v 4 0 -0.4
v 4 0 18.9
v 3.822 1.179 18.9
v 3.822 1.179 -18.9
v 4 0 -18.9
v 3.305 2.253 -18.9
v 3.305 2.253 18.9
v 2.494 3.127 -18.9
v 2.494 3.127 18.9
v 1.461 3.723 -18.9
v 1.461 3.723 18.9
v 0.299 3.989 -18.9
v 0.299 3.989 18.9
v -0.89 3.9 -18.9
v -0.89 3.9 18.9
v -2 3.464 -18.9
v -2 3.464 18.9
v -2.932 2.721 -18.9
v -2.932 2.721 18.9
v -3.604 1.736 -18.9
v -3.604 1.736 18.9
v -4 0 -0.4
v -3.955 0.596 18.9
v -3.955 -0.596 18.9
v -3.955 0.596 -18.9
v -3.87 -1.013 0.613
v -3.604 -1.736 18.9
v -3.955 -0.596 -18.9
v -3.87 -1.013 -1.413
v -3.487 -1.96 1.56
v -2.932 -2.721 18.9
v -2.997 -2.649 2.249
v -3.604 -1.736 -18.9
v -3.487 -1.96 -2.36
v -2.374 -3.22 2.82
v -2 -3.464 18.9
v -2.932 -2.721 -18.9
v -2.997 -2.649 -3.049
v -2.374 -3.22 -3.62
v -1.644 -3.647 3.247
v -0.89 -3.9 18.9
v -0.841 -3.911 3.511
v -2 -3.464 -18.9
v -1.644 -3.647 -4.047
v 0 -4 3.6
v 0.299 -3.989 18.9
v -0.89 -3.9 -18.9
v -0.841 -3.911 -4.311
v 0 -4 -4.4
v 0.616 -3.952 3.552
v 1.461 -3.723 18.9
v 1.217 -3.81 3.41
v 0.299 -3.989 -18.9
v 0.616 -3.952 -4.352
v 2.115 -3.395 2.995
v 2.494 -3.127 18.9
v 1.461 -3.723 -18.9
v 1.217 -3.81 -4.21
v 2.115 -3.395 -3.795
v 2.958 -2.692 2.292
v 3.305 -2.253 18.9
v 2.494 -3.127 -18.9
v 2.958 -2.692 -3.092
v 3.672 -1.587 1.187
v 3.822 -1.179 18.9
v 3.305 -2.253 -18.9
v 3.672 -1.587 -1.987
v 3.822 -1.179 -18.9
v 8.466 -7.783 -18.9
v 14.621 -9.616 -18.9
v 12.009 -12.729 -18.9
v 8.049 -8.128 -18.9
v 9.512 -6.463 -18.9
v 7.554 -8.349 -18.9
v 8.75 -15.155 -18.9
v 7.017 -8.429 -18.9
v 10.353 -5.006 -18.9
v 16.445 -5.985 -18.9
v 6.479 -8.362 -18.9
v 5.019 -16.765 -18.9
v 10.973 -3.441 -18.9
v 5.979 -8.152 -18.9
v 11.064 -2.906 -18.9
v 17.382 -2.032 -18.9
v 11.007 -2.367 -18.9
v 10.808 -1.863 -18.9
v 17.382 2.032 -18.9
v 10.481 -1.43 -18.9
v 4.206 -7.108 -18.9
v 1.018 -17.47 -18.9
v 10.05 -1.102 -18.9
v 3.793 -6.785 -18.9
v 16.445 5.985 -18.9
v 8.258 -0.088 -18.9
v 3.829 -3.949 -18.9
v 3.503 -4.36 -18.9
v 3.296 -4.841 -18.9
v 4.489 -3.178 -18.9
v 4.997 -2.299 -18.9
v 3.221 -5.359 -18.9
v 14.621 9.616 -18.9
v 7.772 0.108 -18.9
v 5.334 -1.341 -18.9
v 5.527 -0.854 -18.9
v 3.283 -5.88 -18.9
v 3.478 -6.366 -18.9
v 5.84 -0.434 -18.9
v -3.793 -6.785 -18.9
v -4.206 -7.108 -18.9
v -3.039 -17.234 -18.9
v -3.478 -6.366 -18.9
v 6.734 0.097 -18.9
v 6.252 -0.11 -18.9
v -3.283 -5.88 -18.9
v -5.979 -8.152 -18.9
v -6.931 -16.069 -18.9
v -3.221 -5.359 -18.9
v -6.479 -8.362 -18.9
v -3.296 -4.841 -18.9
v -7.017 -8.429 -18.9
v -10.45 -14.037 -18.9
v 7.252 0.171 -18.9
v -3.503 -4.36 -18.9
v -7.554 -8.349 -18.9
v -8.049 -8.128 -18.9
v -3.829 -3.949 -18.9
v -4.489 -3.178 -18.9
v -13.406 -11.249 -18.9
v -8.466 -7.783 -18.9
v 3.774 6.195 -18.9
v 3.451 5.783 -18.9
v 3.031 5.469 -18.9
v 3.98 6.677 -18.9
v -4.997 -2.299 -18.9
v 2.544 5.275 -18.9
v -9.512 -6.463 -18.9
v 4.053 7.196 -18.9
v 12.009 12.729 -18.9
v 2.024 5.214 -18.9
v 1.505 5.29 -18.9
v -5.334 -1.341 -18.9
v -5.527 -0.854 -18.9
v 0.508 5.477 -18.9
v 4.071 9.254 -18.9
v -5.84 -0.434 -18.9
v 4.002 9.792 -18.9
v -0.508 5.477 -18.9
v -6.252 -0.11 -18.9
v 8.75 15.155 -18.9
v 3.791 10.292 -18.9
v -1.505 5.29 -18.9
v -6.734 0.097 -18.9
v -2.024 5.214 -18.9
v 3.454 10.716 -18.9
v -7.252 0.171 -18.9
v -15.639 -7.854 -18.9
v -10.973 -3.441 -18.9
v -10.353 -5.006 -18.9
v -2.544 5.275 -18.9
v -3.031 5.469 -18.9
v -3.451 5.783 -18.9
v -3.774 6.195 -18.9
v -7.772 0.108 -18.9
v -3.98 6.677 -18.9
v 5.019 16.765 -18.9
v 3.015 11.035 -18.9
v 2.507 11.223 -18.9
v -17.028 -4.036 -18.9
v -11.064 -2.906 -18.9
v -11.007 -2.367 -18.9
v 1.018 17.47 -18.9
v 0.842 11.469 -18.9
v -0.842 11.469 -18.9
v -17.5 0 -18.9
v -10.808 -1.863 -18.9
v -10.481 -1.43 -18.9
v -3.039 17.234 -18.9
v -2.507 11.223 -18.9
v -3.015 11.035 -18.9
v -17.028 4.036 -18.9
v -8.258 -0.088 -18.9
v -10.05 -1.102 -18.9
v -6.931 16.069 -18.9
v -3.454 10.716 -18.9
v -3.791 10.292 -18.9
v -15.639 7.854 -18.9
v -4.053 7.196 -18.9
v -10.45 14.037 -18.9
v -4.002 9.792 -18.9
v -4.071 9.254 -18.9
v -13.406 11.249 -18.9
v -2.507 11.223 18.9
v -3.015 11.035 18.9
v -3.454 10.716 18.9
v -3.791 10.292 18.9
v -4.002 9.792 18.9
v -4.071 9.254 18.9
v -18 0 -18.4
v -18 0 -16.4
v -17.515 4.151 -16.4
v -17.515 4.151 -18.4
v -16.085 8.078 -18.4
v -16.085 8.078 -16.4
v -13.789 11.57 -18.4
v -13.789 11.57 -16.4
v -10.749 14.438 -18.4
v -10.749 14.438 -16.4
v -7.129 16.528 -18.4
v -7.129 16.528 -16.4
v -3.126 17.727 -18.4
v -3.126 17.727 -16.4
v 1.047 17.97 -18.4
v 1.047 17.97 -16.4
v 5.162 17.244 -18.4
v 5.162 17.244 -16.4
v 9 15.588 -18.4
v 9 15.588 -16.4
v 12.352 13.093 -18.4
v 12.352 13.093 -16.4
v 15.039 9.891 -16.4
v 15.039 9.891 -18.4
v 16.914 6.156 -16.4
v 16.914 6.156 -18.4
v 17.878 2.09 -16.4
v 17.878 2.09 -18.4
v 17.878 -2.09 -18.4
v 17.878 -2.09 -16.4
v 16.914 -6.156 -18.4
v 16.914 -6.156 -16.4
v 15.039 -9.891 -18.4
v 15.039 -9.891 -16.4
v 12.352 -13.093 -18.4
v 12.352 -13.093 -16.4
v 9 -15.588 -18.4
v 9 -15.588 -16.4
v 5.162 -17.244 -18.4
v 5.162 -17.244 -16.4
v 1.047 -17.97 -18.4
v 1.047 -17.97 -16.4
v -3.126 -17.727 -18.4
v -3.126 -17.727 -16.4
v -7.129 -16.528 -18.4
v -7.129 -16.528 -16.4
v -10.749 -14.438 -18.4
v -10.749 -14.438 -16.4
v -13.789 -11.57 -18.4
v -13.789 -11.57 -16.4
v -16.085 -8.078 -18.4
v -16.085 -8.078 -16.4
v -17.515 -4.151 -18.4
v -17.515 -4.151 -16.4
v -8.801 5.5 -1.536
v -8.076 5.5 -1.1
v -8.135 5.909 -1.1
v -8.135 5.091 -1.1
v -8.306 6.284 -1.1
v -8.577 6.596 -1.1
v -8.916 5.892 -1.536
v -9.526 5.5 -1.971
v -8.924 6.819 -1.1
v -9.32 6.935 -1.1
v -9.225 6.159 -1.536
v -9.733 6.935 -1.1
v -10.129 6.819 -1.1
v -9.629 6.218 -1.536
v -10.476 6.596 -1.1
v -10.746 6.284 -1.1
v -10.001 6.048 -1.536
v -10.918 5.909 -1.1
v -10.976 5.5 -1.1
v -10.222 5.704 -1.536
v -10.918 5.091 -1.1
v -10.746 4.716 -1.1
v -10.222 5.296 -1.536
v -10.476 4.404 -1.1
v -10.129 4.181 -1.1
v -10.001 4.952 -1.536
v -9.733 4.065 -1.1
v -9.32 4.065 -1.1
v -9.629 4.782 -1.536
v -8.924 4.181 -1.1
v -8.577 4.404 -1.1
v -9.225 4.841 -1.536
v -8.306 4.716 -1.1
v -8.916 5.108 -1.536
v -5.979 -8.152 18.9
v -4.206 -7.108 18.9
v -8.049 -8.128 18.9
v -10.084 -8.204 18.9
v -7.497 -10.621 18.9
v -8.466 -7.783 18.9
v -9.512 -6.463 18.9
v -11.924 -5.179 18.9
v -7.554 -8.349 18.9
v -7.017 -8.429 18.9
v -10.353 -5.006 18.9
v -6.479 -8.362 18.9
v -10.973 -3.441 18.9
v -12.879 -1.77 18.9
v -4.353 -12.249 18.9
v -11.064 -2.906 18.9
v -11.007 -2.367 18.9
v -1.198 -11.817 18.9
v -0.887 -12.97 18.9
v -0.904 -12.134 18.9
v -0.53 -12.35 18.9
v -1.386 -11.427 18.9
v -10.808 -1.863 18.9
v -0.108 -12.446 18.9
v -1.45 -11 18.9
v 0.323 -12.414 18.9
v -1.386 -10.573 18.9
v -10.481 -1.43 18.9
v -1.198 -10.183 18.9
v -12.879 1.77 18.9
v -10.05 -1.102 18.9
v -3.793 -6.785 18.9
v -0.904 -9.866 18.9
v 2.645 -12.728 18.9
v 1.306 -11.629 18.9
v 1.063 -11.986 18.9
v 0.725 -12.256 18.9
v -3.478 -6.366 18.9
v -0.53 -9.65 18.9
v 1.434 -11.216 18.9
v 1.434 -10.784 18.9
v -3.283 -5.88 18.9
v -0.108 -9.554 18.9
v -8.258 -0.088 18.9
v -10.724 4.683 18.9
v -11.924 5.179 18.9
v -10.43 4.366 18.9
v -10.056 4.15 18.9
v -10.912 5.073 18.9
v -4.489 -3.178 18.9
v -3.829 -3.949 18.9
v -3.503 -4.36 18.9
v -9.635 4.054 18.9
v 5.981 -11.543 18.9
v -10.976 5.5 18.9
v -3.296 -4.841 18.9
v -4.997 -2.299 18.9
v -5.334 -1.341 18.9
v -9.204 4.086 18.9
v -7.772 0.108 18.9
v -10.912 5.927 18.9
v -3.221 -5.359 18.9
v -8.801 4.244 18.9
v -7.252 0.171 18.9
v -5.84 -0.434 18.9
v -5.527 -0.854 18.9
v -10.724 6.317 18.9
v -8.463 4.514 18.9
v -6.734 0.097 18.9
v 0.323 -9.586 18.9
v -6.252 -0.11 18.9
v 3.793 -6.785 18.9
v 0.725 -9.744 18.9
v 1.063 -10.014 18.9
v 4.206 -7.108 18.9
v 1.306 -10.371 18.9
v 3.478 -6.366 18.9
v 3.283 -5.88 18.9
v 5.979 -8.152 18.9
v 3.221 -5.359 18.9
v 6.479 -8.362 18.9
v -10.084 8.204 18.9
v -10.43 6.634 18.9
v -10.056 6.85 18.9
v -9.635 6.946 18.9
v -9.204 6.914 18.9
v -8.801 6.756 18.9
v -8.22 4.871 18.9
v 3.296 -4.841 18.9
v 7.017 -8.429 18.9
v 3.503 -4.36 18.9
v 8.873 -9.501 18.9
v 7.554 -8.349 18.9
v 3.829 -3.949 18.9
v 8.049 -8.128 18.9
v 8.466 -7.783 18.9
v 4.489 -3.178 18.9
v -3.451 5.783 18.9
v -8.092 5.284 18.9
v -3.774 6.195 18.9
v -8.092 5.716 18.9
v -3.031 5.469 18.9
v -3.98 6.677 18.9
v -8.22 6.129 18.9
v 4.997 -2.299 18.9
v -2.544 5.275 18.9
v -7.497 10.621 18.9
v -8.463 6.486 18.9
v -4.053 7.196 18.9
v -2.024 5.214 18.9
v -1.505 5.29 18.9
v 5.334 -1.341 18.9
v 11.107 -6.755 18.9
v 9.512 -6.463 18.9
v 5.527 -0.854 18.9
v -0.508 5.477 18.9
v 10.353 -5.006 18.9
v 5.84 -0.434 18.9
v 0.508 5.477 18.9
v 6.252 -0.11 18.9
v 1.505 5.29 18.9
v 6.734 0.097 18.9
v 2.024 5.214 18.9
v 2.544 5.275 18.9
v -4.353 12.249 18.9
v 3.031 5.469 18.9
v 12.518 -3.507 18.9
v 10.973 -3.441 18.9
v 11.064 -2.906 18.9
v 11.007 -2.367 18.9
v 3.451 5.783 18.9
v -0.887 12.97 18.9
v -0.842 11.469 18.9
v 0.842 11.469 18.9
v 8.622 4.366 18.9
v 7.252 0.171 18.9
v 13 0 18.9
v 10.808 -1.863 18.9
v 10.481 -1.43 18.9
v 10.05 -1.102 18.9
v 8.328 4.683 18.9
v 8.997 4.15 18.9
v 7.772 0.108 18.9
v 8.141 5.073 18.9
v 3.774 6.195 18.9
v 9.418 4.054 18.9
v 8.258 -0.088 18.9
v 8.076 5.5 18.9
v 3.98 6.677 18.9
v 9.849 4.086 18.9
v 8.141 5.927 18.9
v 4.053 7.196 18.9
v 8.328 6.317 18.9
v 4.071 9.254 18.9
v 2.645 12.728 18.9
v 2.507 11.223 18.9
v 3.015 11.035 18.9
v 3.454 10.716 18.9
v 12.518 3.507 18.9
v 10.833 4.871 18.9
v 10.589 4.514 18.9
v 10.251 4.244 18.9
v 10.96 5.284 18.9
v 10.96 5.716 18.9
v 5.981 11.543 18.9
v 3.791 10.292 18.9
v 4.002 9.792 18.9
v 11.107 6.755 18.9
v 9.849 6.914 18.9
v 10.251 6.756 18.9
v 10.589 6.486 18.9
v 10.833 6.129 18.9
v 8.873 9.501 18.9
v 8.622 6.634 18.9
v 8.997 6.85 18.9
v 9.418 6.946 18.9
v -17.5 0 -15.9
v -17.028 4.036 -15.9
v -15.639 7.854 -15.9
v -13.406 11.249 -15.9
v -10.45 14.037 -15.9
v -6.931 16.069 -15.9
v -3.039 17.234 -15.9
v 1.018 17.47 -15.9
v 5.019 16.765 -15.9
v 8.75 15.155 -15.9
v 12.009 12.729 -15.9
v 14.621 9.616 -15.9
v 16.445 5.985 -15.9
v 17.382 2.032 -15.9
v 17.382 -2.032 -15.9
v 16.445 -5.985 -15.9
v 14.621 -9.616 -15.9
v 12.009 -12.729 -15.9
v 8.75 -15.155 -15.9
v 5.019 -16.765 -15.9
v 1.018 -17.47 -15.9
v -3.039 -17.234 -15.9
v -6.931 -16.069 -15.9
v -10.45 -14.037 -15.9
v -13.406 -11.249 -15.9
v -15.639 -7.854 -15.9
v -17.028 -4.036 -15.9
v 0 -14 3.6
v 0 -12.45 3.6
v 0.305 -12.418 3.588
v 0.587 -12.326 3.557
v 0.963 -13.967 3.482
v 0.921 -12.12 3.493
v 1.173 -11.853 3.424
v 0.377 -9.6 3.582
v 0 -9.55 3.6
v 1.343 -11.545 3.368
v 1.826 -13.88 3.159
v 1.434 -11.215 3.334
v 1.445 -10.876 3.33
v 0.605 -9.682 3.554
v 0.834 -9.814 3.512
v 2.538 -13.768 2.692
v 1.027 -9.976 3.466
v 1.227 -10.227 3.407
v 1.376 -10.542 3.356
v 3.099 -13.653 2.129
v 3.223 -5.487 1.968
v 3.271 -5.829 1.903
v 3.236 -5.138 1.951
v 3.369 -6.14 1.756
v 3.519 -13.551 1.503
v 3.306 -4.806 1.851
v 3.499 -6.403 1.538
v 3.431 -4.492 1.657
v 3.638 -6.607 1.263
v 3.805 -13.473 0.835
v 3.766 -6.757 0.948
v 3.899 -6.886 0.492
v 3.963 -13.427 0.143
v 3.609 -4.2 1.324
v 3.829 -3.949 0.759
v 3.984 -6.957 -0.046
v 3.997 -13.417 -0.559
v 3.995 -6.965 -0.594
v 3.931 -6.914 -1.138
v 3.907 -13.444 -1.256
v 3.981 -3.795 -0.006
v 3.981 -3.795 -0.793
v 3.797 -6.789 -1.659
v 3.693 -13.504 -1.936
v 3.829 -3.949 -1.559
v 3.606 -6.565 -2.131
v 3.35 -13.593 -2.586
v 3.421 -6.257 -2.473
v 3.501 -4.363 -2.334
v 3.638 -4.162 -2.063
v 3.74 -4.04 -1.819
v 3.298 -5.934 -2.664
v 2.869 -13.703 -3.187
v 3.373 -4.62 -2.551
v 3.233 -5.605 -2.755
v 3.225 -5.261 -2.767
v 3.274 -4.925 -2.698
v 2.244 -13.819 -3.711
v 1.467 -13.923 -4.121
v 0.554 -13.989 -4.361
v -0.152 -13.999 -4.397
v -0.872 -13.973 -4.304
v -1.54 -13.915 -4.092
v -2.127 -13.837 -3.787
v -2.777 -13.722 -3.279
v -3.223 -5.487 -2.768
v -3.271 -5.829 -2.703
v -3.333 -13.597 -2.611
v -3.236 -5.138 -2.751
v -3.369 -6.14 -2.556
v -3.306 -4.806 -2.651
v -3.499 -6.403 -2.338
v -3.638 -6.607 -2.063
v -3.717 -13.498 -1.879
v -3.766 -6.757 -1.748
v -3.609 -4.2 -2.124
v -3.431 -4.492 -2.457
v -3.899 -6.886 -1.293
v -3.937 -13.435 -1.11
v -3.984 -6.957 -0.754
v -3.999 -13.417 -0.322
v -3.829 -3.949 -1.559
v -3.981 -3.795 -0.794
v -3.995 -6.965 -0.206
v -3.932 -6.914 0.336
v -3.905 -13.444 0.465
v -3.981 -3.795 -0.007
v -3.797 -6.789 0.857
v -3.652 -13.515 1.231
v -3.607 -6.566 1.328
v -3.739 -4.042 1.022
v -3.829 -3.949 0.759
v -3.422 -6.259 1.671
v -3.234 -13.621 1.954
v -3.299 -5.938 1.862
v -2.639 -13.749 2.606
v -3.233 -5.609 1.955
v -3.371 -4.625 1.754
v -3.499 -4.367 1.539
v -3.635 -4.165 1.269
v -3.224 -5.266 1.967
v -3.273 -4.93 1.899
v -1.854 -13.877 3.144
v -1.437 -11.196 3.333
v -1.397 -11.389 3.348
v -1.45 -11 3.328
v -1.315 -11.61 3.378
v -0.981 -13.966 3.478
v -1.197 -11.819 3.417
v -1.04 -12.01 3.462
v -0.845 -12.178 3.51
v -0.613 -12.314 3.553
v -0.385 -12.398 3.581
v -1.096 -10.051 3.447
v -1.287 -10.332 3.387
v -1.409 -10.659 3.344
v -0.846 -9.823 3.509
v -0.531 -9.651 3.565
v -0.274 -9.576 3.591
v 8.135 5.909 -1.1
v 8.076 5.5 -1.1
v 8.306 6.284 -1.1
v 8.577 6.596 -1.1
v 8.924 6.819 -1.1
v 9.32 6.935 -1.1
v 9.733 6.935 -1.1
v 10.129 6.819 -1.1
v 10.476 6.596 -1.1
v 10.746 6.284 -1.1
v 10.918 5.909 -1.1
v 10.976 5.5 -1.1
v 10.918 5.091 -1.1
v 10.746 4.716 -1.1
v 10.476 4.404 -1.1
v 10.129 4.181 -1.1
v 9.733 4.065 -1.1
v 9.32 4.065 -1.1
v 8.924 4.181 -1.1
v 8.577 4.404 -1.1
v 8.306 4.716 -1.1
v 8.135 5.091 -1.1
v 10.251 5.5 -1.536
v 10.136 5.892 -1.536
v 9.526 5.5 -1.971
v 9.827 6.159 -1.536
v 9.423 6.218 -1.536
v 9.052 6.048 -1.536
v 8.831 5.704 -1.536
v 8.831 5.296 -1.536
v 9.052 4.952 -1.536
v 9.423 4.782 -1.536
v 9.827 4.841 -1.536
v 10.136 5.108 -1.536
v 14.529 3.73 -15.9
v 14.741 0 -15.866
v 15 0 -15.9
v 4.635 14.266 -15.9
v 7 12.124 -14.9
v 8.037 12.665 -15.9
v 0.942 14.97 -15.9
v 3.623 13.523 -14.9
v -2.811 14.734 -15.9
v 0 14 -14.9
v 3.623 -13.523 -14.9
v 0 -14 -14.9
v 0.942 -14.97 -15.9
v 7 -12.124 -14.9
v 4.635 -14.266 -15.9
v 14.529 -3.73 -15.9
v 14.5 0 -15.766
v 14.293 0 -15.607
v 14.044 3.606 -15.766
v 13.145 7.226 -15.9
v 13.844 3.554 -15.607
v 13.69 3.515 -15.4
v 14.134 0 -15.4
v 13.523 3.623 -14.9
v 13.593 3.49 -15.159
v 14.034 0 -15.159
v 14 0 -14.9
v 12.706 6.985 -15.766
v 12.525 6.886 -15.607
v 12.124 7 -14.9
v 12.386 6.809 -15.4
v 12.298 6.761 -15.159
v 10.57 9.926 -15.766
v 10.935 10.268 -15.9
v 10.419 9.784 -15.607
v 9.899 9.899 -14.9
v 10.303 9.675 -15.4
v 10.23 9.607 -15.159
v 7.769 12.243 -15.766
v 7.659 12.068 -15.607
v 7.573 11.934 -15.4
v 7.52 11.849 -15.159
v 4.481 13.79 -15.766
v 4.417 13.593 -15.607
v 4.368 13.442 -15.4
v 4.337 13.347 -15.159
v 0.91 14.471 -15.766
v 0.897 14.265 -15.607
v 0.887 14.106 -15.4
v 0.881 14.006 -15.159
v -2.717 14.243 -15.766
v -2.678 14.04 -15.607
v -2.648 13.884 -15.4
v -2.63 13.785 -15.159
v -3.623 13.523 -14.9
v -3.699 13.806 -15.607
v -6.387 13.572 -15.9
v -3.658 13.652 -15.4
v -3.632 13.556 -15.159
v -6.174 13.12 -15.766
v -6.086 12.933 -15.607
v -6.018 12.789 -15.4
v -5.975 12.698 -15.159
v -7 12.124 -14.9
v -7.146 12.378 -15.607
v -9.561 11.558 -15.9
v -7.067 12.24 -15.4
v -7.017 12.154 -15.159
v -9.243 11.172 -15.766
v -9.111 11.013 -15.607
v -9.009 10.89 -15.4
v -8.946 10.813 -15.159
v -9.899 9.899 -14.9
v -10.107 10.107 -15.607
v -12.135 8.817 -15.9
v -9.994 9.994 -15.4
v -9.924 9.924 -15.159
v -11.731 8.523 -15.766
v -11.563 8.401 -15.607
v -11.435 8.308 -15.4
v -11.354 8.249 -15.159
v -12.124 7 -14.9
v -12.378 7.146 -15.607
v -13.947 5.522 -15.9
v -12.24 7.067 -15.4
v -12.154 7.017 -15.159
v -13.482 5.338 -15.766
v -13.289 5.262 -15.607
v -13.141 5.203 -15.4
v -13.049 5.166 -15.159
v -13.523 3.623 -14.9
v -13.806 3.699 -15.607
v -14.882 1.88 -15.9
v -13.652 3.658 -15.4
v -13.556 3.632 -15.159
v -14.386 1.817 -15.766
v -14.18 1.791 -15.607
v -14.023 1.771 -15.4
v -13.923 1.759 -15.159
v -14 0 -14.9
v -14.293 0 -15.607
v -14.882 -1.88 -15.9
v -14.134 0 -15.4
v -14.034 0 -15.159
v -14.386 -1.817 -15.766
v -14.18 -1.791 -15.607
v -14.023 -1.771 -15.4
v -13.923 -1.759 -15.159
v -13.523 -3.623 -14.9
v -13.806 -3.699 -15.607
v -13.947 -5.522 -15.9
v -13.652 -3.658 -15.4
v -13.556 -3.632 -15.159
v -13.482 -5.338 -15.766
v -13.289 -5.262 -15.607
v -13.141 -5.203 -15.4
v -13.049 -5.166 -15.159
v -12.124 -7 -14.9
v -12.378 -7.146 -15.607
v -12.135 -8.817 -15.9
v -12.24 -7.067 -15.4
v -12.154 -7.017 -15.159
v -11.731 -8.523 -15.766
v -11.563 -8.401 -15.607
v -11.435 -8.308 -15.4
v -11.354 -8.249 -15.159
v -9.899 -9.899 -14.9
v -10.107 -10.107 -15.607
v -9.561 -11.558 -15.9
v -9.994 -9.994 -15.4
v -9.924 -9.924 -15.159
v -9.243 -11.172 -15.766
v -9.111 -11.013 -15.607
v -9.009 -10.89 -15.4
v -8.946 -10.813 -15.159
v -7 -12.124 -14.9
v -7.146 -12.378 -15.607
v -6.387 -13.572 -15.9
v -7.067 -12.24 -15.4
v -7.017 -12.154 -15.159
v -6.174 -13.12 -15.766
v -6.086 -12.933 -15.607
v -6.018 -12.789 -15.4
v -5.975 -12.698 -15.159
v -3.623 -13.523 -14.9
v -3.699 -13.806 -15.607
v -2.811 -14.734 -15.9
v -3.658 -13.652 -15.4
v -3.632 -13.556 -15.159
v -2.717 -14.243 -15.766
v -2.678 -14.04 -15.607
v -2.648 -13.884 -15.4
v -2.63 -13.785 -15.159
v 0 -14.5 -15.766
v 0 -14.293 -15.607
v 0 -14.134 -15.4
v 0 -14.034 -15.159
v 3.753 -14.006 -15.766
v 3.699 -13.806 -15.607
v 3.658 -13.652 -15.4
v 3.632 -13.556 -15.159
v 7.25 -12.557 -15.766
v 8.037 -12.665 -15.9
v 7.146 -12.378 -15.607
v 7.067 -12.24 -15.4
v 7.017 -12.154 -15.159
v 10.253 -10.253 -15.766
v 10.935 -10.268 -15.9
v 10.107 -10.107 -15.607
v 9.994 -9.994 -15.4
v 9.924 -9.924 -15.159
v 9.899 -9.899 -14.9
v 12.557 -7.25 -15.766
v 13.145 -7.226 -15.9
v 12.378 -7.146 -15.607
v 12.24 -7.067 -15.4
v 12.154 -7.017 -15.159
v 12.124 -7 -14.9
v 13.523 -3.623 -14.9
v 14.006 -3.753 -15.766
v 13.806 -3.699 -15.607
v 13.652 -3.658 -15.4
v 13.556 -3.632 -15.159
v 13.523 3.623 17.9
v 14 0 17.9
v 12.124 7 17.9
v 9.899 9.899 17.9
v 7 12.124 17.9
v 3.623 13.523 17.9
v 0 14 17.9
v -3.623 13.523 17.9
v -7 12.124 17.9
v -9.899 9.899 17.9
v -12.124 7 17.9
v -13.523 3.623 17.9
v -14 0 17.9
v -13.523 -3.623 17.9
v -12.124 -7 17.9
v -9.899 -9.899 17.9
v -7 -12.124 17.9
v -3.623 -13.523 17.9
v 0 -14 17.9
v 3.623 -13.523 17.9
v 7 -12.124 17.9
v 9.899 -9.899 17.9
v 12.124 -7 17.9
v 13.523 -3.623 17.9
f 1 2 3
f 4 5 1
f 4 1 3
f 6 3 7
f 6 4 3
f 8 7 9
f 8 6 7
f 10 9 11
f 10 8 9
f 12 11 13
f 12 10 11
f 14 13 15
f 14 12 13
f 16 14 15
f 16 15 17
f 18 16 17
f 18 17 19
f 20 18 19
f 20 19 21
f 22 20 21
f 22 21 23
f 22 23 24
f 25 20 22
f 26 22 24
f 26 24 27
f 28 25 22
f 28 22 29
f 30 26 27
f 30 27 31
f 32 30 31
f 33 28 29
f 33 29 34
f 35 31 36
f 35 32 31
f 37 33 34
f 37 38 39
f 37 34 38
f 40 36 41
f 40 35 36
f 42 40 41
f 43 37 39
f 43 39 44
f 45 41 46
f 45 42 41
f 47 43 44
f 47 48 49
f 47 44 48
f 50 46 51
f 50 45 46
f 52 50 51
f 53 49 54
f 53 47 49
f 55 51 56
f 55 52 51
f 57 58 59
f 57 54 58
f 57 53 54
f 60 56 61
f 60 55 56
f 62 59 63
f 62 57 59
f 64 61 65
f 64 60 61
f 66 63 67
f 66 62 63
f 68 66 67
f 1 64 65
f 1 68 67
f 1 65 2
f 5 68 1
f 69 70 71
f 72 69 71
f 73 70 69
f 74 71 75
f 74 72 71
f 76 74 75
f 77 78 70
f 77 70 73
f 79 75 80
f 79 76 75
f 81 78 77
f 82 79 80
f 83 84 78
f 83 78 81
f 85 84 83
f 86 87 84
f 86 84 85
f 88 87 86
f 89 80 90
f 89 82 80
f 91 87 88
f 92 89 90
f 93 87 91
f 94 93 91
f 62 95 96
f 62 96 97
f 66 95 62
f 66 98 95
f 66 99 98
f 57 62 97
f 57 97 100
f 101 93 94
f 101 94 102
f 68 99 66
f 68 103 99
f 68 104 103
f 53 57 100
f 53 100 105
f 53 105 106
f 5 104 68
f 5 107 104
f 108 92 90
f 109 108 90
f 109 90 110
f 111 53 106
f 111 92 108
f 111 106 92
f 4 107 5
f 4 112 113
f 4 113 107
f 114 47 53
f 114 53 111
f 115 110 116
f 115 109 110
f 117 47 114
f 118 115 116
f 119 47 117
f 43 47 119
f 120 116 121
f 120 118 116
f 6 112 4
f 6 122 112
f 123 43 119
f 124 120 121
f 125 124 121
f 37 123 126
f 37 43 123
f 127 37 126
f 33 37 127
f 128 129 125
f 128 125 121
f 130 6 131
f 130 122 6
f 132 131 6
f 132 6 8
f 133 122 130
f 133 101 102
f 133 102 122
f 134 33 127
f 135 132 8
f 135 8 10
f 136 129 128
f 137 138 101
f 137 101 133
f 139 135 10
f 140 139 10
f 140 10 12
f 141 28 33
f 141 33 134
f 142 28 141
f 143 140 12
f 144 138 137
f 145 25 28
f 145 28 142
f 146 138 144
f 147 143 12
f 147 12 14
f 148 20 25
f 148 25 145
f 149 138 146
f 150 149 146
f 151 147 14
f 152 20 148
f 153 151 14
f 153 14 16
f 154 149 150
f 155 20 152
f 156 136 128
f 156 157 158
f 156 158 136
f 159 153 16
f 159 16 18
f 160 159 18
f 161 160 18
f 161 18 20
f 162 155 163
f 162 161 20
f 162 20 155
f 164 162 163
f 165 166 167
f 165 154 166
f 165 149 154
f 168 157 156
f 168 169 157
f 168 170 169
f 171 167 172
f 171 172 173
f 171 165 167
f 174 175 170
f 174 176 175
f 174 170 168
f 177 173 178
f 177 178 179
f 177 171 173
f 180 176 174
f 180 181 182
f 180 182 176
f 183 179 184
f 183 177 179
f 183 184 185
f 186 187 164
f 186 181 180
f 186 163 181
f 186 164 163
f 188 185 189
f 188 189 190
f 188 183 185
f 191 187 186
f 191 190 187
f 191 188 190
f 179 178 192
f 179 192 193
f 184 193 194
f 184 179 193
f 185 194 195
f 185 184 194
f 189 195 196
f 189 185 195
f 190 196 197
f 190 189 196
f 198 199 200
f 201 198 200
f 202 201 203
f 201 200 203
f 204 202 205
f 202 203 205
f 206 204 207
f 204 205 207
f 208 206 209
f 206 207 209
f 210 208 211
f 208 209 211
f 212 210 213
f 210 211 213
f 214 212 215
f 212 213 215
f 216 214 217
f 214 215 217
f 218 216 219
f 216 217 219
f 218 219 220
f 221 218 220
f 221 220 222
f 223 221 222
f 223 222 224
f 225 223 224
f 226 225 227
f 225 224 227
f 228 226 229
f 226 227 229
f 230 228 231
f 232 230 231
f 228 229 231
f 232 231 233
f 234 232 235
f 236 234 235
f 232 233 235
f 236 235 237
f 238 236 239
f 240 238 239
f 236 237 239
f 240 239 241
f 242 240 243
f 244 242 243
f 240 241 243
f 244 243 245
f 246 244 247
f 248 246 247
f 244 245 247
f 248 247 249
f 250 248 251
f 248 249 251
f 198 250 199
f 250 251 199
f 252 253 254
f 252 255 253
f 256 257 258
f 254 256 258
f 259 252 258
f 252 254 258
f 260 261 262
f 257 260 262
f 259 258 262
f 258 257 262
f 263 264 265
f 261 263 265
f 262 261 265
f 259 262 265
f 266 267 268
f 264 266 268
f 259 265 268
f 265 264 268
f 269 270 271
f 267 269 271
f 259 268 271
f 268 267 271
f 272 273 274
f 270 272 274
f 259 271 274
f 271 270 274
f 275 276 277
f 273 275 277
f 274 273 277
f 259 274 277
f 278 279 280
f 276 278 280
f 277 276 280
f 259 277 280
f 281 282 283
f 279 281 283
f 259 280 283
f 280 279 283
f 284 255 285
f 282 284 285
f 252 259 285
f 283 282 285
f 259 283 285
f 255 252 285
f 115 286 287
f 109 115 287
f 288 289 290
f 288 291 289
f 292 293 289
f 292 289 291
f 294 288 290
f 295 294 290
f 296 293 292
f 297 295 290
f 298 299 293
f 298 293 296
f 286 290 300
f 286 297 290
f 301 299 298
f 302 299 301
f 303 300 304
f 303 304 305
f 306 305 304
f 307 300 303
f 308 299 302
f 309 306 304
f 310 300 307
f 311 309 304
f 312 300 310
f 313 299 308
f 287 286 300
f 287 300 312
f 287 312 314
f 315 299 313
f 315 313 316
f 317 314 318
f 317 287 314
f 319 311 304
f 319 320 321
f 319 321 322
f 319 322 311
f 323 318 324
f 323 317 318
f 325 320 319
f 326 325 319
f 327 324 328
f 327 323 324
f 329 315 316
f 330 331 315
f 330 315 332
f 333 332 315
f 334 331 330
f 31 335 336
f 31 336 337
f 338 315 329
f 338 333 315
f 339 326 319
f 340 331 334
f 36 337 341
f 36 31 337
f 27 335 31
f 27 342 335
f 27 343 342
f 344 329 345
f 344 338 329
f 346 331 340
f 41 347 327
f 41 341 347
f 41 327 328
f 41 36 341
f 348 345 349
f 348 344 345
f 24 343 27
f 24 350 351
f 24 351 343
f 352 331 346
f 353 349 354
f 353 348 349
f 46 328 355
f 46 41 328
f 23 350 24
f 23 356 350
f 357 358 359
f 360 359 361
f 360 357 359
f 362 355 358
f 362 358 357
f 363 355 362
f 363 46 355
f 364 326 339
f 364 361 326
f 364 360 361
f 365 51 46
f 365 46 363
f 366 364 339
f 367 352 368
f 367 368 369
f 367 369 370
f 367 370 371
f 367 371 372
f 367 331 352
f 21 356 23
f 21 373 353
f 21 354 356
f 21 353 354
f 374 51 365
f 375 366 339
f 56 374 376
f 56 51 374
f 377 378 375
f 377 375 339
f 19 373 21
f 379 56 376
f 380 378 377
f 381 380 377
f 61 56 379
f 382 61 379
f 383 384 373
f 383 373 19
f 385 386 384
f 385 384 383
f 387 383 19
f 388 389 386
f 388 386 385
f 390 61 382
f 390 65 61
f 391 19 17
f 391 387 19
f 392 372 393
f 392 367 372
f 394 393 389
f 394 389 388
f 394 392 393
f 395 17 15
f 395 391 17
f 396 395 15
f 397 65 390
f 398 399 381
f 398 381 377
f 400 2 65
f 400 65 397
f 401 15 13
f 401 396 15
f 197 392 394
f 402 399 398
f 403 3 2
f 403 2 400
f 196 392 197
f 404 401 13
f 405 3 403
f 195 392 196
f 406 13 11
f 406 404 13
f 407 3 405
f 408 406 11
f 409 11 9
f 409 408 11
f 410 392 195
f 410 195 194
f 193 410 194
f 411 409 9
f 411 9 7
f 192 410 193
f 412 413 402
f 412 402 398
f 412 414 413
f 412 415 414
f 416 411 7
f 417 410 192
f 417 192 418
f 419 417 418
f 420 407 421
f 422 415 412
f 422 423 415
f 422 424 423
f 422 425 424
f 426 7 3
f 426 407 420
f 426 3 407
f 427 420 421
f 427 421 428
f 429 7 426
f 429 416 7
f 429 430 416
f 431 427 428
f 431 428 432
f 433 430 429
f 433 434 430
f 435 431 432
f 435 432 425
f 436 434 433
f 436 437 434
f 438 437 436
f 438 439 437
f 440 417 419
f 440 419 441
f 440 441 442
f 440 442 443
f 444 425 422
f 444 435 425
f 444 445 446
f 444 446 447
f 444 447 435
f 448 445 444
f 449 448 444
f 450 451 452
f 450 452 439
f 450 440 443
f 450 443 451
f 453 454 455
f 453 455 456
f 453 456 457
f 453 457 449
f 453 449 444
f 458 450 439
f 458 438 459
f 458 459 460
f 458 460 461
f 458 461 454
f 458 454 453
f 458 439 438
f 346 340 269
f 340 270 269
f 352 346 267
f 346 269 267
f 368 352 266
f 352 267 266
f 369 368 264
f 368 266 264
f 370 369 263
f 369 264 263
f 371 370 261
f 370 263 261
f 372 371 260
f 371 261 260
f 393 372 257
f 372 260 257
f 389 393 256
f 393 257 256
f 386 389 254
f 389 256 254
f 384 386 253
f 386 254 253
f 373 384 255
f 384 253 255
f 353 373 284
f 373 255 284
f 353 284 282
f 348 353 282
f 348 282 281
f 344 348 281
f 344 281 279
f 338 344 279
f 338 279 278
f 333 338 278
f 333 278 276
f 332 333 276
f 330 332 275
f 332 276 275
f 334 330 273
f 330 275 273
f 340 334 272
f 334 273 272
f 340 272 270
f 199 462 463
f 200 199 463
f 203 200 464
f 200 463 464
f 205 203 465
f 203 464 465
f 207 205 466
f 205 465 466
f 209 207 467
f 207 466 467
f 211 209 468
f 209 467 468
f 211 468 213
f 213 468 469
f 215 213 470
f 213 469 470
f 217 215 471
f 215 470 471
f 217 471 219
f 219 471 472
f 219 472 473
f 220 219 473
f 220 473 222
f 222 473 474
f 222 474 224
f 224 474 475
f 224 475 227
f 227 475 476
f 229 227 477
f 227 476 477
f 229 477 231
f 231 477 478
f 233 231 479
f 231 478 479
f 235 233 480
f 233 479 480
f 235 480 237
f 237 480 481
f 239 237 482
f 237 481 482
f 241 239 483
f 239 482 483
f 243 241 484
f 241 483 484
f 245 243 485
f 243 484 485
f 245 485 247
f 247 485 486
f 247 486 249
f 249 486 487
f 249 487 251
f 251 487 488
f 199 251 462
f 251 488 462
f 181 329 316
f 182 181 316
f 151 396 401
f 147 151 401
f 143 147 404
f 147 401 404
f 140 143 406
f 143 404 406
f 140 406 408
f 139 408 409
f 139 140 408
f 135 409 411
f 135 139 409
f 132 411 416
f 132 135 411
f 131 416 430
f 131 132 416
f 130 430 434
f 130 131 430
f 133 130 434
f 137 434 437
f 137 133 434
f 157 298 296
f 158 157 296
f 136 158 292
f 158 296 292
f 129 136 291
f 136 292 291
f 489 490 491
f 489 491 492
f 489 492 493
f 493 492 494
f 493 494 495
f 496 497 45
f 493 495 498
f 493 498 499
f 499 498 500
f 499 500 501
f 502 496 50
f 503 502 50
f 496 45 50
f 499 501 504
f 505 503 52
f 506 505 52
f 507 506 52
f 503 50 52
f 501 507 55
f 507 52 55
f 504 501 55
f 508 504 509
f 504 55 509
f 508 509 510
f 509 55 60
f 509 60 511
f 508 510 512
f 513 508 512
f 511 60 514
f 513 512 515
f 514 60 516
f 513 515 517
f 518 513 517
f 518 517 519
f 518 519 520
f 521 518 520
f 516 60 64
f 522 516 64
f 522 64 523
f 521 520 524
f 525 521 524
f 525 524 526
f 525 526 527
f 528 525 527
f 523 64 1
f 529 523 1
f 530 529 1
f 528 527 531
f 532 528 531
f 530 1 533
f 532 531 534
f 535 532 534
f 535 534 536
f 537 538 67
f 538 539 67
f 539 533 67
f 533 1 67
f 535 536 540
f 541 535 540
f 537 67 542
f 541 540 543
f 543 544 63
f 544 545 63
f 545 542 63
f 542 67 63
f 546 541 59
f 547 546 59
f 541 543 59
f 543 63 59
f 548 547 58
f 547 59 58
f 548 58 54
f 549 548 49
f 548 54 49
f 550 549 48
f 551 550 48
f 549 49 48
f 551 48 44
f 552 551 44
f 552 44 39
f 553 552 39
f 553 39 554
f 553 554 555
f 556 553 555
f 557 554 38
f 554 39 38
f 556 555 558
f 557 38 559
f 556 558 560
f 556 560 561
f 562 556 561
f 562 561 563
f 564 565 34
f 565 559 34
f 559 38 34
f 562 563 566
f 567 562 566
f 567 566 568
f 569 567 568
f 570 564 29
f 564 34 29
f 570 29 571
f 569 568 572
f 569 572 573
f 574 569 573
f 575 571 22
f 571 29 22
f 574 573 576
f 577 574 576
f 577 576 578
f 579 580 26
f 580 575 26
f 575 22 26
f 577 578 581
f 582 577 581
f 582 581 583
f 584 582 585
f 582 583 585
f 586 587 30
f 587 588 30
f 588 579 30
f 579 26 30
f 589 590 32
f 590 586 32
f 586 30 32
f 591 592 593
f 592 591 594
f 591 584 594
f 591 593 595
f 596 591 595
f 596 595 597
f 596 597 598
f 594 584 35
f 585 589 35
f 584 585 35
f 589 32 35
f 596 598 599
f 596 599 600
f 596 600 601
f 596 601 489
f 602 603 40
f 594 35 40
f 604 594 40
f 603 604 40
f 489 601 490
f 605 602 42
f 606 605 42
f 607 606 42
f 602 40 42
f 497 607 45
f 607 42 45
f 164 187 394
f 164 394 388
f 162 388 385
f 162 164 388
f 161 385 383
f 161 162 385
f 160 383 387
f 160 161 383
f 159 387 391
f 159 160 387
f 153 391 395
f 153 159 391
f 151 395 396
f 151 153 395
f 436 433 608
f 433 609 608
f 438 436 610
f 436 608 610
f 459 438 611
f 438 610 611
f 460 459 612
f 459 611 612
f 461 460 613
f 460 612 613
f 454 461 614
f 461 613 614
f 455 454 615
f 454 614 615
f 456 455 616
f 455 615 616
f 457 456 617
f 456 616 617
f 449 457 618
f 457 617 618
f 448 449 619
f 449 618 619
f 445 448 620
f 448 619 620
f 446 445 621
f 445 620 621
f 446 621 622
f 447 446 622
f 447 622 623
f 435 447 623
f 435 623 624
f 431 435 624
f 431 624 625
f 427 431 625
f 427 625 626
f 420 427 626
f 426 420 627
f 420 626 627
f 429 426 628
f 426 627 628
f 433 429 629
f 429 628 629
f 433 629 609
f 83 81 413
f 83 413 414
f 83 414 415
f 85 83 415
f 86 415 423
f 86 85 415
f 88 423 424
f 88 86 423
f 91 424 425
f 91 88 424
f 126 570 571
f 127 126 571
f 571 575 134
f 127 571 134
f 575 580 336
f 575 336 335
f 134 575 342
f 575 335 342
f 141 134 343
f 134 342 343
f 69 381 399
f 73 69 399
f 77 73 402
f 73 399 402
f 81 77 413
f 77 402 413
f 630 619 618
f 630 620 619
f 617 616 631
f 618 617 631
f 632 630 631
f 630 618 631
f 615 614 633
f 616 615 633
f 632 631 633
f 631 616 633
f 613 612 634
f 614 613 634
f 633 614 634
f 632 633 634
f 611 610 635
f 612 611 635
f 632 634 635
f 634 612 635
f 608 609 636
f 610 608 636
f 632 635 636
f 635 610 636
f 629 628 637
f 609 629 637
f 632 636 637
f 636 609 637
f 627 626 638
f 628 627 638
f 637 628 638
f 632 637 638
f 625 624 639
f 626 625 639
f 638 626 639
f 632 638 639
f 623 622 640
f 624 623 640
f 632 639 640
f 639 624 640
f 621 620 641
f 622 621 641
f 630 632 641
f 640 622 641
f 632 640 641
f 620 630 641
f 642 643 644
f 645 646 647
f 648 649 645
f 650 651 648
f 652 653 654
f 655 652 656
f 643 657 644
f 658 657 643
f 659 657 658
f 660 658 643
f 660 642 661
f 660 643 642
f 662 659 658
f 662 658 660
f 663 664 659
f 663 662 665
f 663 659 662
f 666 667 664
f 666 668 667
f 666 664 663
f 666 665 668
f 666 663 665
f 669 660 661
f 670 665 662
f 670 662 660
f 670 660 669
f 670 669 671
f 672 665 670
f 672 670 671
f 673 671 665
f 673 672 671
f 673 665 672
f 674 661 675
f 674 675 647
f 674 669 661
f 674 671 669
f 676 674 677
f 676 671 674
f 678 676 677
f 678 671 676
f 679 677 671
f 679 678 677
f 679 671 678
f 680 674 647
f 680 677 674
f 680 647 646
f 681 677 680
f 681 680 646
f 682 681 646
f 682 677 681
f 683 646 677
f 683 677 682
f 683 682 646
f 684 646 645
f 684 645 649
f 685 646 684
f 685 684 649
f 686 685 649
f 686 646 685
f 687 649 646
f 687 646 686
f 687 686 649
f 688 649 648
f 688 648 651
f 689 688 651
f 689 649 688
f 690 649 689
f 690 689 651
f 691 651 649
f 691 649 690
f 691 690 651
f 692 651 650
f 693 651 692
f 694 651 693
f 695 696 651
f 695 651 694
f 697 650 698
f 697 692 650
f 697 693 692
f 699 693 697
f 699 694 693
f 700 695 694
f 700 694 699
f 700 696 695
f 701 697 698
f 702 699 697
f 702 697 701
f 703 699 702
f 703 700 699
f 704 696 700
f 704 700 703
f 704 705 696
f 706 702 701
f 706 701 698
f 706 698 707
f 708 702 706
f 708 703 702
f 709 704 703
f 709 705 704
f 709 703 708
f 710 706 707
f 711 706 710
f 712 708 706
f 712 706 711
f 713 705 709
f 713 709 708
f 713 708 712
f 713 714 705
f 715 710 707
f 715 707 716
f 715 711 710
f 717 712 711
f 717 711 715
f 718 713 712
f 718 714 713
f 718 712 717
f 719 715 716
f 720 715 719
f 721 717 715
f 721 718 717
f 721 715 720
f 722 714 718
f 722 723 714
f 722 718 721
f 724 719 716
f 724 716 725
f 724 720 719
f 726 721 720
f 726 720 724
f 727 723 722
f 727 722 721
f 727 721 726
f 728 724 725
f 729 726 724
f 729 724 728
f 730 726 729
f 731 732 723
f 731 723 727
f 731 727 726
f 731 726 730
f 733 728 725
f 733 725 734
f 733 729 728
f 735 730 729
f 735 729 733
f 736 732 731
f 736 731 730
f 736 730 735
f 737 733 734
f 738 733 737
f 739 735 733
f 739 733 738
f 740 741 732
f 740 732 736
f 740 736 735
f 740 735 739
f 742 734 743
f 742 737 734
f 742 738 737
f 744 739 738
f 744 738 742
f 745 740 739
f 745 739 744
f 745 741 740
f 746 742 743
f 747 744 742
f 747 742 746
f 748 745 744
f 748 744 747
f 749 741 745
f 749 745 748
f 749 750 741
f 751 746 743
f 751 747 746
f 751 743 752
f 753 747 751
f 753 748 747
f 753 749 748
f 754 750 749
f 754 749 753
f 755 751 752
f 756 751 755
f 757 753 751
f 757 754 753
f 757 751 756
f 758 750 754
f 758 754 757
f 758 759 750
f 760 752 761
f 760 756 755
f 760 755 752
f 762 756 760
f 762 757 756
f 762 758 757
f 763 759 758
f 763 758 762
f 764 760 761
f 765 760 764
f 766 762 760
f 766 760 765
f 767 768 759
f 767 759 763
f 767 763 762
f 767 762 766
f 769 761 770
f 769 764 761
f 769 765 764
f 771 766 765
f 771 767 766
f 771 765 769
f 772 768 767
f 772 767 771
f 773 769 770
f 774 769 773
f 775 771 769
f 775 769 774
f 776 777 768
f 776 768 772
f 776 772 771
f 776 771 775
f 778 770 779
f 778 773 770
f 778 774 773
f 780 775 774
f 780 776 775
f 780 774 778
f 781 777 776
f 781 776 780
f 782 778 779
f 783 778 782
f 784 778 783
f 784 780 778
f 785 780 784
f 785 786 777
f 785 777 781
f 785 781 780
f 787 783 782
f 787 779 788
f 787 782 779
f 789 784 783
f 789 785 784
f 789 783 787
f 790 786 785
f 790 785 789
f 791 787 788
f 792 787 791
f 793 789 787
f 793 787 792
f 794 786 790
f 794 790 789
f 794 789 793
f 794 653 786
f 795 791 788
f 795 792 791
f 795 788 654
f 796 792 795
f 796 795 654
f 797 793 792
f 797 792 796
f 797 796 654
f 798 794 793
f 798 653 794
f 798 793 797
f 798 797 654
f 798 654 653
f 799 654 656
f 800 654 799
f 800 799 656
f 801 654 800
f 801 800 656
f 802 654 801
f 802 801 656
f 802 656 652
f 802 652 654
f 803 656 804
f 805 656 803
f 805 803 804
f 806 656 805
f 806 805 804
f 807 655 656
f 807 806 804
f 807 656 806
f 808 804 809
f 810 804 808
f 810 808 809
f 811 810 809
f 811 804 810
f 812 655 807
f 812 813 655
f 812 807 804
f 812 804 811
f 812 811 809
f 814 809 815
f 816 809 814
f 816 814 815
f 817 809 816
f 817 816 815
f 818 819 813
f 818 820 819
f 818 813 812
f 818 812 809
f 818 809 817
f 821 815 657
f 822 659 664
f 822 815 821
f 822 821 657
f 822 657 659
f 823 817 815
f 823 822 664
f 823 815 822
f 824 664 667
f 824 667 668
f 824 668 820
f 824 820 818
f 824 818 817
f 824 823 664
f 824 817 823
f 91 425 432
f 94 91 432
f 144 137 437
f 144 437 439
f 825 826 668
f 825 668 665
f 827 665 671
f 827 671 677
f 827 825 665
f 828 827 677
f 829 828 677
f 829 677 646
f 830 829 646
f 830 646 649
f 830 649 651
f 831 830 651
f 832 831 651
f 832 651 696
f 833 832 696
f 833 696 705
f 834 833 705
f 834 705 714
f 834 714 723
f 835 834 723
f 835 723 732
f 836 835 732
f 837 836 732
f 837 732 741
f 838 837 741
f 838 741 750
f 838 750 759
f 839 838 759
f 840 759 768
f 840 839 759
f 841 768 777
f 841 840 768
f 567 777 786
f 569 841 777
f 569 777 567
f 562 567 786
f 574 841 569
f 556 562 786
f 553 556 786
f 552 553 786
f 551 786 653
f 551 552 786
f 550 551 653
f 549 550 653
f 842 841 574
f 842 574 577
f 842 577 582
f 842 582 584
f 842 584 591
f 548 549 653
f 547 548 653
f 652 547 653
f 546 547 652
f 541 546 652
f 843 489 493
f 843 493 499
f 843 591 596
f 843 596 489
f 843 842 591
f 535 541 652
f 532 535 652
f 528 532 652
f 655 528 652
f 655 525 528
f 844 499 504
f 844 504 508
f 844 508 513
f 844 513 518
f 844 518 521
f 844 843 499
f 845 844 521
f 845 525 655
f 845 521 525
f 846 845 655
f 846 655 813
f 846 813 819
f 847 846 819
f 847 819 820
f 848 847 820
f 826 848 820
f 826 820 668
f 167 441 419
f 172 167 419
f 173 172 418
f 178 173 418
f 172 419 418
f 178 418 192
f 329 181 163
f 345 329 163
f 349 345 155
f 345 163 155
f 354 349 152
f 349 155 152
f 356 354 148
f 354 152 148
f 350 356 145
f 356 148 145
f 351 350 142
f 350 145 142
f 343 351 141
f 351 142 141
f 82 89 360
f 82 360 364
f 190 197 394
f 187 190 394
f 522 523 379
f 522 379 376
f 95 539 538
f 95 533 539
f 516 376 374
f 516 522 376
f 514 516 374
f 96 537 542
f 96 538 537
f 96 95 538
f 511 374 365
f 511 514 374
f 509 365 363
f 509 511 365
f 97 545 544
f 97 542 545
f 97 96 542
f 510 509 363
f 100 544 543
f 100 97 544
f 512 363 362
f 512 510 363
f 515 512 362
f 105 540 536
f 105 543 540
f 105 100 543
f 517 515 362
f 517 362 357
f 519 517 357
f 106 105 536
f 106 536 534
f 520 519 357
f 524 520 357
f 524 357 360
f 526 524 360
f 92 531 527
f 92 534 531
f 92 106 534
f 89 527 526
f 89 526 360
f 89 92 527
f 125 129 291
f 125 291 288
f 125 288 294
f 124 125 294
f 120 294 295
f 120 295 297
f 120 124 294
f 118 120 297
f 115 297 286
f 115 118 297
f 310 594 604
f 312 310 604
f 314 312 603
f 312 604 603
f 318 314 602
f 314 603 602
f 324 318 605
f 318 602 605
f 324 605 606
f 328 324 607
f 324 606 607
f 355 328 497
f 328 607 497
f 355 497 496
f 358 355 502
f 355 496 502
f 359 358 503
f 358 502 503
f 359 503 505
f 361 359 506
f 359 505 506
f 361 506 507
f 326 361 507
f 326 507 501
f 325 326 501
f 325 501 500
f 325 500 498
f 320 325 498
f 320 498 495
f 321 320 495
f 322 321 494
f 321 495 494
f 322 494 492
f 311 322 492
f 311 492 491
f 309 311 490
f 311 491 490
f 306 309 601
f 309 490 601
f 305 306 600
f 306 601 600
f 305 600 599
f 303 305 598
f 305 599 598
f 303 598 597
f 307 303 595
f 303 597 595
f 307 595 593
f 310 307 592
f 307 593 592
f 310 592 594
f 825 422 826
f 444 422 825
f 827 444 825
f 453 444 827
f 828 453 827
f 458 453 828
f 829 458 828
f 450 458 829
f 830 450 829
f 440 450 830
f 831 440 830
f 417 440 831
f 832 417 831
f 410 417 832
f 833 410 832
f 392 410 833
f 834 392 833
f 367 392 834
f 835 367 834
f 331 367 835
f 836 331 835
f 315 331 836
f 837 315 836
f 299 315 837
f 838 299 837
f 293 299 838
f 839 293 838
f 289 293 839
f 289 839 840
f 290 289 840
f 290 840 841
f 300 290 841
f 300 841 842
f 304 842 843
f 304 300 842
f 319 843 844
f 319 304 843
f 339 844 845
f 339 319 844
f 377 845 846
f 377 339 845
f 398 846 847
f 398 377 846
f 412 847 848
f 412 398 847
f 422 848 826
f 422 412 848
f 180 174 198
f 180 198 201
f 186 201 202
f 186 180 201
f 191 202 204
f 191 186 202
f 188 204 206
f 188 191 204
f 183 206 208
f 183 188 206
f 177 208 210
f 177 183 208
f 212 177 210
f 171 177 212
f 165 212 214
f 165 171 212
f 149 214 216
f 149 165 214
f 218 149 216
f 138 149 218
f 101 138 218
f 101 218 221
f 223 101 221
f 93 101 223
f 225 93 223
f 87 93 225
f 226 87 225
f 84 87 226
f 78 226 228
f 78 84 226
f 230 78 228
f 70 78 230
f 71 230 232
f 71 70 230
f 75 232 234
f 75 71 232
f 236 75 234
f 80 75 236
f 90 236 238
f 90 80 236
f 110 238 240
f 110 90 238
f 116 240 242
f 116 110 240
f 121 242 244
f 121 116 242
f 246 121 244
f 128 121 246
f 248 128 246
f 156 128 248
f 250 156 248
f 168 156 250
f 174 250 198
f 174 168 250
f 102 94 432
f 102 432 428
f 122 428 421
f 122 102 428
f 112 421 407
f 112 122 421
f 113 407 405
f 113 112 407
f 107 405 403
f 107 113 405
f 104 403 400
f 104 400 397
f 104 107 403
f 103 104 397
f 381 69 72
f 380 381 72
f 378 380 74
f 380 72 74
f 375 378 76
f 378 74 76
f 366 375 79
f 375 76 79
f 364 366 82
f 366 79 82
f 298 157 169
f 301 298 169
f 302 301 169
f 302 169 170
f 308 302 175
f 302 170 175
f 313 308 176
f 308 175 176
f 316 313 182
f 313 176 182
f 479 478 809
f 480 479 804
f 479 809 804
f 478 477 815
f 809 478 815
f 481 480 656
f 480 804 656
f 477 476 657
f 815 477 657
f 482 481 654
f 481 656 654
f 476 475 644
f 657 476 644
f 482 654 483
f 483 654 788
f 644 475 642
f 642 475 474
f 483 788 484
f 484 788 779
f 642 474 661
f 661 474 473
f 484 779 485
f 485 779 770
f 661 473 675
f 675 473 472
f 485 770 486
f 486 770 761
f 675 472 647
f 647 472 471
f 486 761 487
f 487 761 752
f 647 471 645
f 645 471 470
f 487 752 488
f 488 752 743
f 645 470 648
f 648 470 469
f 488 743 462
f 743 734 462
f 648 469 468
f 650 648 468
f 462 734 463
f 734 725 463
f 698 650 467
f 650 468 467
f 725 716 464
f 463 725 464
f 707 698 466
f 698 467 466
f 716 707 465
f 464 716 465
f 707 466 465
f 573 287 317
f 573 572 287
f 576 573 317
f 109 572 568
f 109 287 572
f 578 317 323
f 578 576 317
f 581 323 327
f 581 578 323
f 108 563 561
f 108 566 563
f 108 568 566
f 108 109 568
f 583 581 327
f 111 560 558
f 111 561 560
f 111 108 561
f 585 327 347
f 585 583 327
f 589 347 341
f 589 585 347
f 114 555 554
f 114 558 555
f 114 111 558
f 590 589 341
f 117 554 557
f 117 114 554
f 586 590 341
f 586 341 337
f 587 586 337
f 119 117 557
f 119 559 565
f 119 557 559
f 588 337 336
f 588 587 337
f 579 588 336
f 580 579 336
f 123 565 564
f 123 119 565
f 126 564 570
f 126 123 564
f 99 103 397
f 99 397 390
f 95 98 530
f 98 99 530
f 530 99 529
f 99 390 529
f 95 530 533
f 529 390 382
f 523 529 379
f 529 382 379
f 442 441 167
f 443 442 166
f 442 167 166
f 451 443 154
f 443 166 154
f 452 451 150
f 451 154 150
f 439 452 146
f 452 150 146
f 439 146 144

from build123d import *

# Parameters (mm, degrees)
CROQUIS1_R                      = 14
CROQUIS1_R_2                    = 4
SALIENTE_EXTRUIR1_DEPTH         = 18.9
CHAFL_N1_SIZE                   = 1
CORTAR_EXTRUIR1_REACH           = 44.671
REDONDEO1_R                     = 2
MATRIZC1_COUNT                  = 3
REDONDEO1_OF_MATRIZC1_R         = 2
CROQUIS3_R                      = 4
CORTAR_EXTRUIR2_DEPTH           = 29
TALADRO_ROSCADO_M3_5X0_61_D     = 2.9
TALADRO_ROSCADO_M3_5X0_61_DEPTH = 20
TALADRO_ROSCADO_M3_5X0_61_TIP   = 0.871247898
SALIENTE_EXTRUIR2_START         = -3
CROQUIS6_R                      = 18
CROQUIS6_R_2                    = 4
SALIENTE_EXTRUIR2_DEPTH         = 3
CHAFL_N2_SIZE                   = 0.5
REDONDEO2_R                     = 1


with BuildPart() as part:
    # Croquis1 → Saliente-Extruir1 (new, symmetric)
    with BuildSketch(Plane(origin=(0, 0, 0), x_dir=(0, 1, 0), z_dir=(0, 0, 1))):
        with Locations(Location((0, 0, 0), (0, 0, 270))):
            Circle(CROQUIS1_R)
        with Locations(Location((0, 0, 0), (0, 0, 270))):
            Circle(CROQUIS1_R_2, mode=Mode.SUBTRACT)
    extrude(amount=SALIENTE_EXTRUIR1_DEPTH, both=True)

    # Chaflán1
    chafl_n1_edges = [part.edges().sort_by_distance(p)[0] for p in [
        (-14, 0, 18.9),
    ]]
    chamfer(chafl_n1_edges, length=CHAFL_N1_SIZE)

    # Croquis2 → Cortar-Extruir1 (cut, up to next)
    with BuildSketch(Plane.XY.offset(18.9), mode=Mode.PRIVATE) as cortar_extruir1_sk1:
        with BuildLine():
            Line((4.022667121, 3.750753155), (4.08375287, 10.750486617))
            ThreePointArc((4.08375287, 10.750486617), (0, 11.5), (-4.08375287, 10.750486617))
            Line((-4.08375287, 10.750486617), (-4.022667121, 3.750753155))
            ThreePointArc((-4.022667121, 3.750753155), (0, 5.5), (4.022667121, 3.750753155))
        make_face()
    cortar_extruir1_tool1 = extrude(cortar_extruir1_sk1.sketch, amount=-CORTAR_EXTRUIR1_REACH, mode=Mode.PRIVATE) & part.part
    cortar_extruir1 = cortar_extruir1_tool1.solids().sort_by_distance((0, 8.096632, 18.9))[0]
    add(cortar_extruir1, mode=Mode.SUBTRACT)

    # Redondeo1
    redondeo1_edges = [part.edges().sort_by_distance(p)[0] for p in [
        (4.022667121, 3.750753155, 0),
        (-4.022667121, 3.750753155, 0),
        (-4.08375287, 10.750486617, 0),
        (4.08375287, 10.750486617, 0),
    ]]
    fillet(redondeo1_edges, radius=REDONDEO1_R)

    # MatrizC1: Cortar-Extruir1 ×3 about axis
    matrizc1_axis = Axis((0, 0, 0), (0, 0, 1))
    for i in range(1, MATRIZC1_COUNT):
        add(cortar_extruir1.rotate(matrizc1_axis, i * 360 / MATRIZC1_COUNT), mode=Mode.SUBTRACT)

    # Redondeo1 of MatrizC1
    redondeo1_of_matrizc1_edges = [part.edges().sort_by_distance(p)[0] for p in [
        (-5.259581076, 1.60835534, 0),
        (-1.236913955, -5.359108496, 0),
        (-7.268318079, -8.911877036, 0),
        (-11.352070948, -1.838609581, 0),
        (1.236913955, -5.359108496, 0),
        (5.259581076, 1.60835534, 0),
        (11.352070948, -1.838609581, 0),
        (7.268318079, -8.911877036, 0),
    ]]
    fillet(redondeo1_of_matrizc1_edges, radius=REDONDEO1_OF_MATRIZC1_R)

    # Croquis3 → Cortar-Extruir2 (cut)
    with BuildSketch(Plane(origin=(0, 0, 0), x_dir=(-1, 0, 0), z_dir=(0, 1, 0))):
        with Locations(Location((0, -0.4, 0), (0, 0, 90))):
            Circle(CROQUIS3_R)
    extrude(amount=-CORTAR_EXTRUIR2_DEPTH, mode=Mode.SUBTRACT)

    # Taladro roscado M3.5x0.61
    with Locations(Plane.XY.offset(18.9)):
        with Locations((0, 0), (-9.526279442, 5.5), (9.526279442, 5.5), (0, -11)):
            Hole(TALADRO_ROSCADO_M3_5X0_61_D / 2, depth=TALADRO_ROSCADO_M3_5X0_61_DEPTH)
            with Locations((0, 0, -(TALADRO_ROSCADO_M3_5X0_61_DEPTH + TALADRO_ROSCADO_M3_5X0_61_TIP / 2))):  # 118° drill point
                Cone(0, TALADRO_ROSCADO_M3_5X0_61_D / 2, TALADRO_ROSCADO_M3_5X0_61_TIP, mode=Mode.SUBTRACT)

    # Croquis6 → Saliente-Extruir2 (add)
    with BuildSketch(Plane(origin=(0, 0, -18.9), x_dir=(1, 0, 0), z_dir=(0, 0, -1)).offset(SALIENTE_EXTRUIR2_START)):
        with Locations(Location((0, 0, 0), (0, 0, 180))):
            Circle(CROQUIS6_R)
        Circle(CROQUIS6_R_2, mode=Mode.SUBTRACT)
        with BuildLine():
            Line((-10.049642775, 1.101731175), (-8.258409927, 0.08830039))
            ThreePointArc((-8.258409927, 0.08830039), (-6.485918981, -0.009361739), (-5.333946058, 1.341275307))
            ThreePointArc((-5.333946058, 1.341275307), (-4.763139721, 2.75), (-3.828551518, 3.948695135))
            ThreePointArc((-3.828551518, 3.948695135), (-3.234851986, 5.621651474), (-4.205675344, 7.107842597))
            Line((-4.205675344, 7.107842597), (-5.978948573, 8.152380354))
            ThreePointArc((-5.978948573, 8.152380354), (-7.288087529, 8.407385768), (-8.466451677, 7.782621409))
            ThreePointArc((-8.466451677, 7.782621409), (-9.959292144, 5.75), (-10.973173687, 3.440851528))
            ThreePointArc((-10.973173687, 3.440851528), (-10.92505342, 2.107976061), (-10.049642775, 1.101731175))
        make_face(mode=Mode.SUBTRACT)
        with BuildLine():
            Line((5.978948573, 8.152380354), (4.205675344, 7.107842597))
            ThreePointArc((4.205675344, 7.107842597), (3.234851986, 5.621651474), (3.828551518, 3.948695135))
            ThreePointArc((3.828551518, 3.948695135), (4.763139721, 2.75), (5.333946058, 1.341275307))
            ThreePointArc((5.333946058, 1.341275307), (6.485918981, -0.009361739), (8.258409927, 0.08830039))
            Line((8.258409927, 0.08830039), (10.049642775, 1.101731175))
            ThreePointArc((10.049642775, 1.101731175), (10.92505342, 2.107976061), (10.973173687, 3.440851528))
            ThreePointArc((10.973173687, 3.440851528), (9.959292144, 5.75), (8.466451677, 7.782621409))
            ThreePointArc((8.466451677, 7.782621409), (7.288087529, 8.407385768), (5.978948573, 8.152380354))
        make_face(mode=Mode.SUBTRACT)
        with BuildLine():
            Line((-4.052734583, -7.196142986), (-4.070694202, -9.254111529))
            ThreePointArc((-4.070694202, -9.254111529), (-3.63696589, -10.51536183), (-2.50672201, -11.223472937))
            ThreePointArc((-2.50672201, -11.223472937), (0, -11.5), (2.50672201, -11.223472937))
            ThreePointArc((2.50672201, -11.223472937), (3.63696589, -10.51536183), (4.070694202, -9.254111529))
            Line((4.070694202, -9.254111529), (4.052734583, -7.196142986))
            ThreePointArc((4.052734583, -7.196142986), (3.251066995, -5.612289735), (1.50539454, -5.289970442))
            ThreePointArc((1.50539454, -5.289970442), (0, -5.5), (-1.50539454, -5.289970442))
            ThreePointArc((-1.50539454, -5.289970442), (-3.251066995, -5.612289735), (-4.052734583, -7.196142986))
        make_face(mode=Mode.SUBTRACT)
    extrude(amount=SALIENTE_EXTRUIR2_DEPTH)

    # Chaflán2
    chafl_n2_edges = [part.edges().sort_by_distance(p)[0] for p in [
        (18, 0, -18.9),
        (18, 0, -15.9),
    ]]
    chamfer(chafl_n2_edges, length=CHAFL_N2_SIZE)

    # Redondeo2
    redondeo2_edges = [part.edges().sort_by_distance(p)[0] for p in [
        (-14, 0, -15.9),
    ]]
    fillet(redondeo2_edges, radius=REDONDEO2_R)


solid = part.part
